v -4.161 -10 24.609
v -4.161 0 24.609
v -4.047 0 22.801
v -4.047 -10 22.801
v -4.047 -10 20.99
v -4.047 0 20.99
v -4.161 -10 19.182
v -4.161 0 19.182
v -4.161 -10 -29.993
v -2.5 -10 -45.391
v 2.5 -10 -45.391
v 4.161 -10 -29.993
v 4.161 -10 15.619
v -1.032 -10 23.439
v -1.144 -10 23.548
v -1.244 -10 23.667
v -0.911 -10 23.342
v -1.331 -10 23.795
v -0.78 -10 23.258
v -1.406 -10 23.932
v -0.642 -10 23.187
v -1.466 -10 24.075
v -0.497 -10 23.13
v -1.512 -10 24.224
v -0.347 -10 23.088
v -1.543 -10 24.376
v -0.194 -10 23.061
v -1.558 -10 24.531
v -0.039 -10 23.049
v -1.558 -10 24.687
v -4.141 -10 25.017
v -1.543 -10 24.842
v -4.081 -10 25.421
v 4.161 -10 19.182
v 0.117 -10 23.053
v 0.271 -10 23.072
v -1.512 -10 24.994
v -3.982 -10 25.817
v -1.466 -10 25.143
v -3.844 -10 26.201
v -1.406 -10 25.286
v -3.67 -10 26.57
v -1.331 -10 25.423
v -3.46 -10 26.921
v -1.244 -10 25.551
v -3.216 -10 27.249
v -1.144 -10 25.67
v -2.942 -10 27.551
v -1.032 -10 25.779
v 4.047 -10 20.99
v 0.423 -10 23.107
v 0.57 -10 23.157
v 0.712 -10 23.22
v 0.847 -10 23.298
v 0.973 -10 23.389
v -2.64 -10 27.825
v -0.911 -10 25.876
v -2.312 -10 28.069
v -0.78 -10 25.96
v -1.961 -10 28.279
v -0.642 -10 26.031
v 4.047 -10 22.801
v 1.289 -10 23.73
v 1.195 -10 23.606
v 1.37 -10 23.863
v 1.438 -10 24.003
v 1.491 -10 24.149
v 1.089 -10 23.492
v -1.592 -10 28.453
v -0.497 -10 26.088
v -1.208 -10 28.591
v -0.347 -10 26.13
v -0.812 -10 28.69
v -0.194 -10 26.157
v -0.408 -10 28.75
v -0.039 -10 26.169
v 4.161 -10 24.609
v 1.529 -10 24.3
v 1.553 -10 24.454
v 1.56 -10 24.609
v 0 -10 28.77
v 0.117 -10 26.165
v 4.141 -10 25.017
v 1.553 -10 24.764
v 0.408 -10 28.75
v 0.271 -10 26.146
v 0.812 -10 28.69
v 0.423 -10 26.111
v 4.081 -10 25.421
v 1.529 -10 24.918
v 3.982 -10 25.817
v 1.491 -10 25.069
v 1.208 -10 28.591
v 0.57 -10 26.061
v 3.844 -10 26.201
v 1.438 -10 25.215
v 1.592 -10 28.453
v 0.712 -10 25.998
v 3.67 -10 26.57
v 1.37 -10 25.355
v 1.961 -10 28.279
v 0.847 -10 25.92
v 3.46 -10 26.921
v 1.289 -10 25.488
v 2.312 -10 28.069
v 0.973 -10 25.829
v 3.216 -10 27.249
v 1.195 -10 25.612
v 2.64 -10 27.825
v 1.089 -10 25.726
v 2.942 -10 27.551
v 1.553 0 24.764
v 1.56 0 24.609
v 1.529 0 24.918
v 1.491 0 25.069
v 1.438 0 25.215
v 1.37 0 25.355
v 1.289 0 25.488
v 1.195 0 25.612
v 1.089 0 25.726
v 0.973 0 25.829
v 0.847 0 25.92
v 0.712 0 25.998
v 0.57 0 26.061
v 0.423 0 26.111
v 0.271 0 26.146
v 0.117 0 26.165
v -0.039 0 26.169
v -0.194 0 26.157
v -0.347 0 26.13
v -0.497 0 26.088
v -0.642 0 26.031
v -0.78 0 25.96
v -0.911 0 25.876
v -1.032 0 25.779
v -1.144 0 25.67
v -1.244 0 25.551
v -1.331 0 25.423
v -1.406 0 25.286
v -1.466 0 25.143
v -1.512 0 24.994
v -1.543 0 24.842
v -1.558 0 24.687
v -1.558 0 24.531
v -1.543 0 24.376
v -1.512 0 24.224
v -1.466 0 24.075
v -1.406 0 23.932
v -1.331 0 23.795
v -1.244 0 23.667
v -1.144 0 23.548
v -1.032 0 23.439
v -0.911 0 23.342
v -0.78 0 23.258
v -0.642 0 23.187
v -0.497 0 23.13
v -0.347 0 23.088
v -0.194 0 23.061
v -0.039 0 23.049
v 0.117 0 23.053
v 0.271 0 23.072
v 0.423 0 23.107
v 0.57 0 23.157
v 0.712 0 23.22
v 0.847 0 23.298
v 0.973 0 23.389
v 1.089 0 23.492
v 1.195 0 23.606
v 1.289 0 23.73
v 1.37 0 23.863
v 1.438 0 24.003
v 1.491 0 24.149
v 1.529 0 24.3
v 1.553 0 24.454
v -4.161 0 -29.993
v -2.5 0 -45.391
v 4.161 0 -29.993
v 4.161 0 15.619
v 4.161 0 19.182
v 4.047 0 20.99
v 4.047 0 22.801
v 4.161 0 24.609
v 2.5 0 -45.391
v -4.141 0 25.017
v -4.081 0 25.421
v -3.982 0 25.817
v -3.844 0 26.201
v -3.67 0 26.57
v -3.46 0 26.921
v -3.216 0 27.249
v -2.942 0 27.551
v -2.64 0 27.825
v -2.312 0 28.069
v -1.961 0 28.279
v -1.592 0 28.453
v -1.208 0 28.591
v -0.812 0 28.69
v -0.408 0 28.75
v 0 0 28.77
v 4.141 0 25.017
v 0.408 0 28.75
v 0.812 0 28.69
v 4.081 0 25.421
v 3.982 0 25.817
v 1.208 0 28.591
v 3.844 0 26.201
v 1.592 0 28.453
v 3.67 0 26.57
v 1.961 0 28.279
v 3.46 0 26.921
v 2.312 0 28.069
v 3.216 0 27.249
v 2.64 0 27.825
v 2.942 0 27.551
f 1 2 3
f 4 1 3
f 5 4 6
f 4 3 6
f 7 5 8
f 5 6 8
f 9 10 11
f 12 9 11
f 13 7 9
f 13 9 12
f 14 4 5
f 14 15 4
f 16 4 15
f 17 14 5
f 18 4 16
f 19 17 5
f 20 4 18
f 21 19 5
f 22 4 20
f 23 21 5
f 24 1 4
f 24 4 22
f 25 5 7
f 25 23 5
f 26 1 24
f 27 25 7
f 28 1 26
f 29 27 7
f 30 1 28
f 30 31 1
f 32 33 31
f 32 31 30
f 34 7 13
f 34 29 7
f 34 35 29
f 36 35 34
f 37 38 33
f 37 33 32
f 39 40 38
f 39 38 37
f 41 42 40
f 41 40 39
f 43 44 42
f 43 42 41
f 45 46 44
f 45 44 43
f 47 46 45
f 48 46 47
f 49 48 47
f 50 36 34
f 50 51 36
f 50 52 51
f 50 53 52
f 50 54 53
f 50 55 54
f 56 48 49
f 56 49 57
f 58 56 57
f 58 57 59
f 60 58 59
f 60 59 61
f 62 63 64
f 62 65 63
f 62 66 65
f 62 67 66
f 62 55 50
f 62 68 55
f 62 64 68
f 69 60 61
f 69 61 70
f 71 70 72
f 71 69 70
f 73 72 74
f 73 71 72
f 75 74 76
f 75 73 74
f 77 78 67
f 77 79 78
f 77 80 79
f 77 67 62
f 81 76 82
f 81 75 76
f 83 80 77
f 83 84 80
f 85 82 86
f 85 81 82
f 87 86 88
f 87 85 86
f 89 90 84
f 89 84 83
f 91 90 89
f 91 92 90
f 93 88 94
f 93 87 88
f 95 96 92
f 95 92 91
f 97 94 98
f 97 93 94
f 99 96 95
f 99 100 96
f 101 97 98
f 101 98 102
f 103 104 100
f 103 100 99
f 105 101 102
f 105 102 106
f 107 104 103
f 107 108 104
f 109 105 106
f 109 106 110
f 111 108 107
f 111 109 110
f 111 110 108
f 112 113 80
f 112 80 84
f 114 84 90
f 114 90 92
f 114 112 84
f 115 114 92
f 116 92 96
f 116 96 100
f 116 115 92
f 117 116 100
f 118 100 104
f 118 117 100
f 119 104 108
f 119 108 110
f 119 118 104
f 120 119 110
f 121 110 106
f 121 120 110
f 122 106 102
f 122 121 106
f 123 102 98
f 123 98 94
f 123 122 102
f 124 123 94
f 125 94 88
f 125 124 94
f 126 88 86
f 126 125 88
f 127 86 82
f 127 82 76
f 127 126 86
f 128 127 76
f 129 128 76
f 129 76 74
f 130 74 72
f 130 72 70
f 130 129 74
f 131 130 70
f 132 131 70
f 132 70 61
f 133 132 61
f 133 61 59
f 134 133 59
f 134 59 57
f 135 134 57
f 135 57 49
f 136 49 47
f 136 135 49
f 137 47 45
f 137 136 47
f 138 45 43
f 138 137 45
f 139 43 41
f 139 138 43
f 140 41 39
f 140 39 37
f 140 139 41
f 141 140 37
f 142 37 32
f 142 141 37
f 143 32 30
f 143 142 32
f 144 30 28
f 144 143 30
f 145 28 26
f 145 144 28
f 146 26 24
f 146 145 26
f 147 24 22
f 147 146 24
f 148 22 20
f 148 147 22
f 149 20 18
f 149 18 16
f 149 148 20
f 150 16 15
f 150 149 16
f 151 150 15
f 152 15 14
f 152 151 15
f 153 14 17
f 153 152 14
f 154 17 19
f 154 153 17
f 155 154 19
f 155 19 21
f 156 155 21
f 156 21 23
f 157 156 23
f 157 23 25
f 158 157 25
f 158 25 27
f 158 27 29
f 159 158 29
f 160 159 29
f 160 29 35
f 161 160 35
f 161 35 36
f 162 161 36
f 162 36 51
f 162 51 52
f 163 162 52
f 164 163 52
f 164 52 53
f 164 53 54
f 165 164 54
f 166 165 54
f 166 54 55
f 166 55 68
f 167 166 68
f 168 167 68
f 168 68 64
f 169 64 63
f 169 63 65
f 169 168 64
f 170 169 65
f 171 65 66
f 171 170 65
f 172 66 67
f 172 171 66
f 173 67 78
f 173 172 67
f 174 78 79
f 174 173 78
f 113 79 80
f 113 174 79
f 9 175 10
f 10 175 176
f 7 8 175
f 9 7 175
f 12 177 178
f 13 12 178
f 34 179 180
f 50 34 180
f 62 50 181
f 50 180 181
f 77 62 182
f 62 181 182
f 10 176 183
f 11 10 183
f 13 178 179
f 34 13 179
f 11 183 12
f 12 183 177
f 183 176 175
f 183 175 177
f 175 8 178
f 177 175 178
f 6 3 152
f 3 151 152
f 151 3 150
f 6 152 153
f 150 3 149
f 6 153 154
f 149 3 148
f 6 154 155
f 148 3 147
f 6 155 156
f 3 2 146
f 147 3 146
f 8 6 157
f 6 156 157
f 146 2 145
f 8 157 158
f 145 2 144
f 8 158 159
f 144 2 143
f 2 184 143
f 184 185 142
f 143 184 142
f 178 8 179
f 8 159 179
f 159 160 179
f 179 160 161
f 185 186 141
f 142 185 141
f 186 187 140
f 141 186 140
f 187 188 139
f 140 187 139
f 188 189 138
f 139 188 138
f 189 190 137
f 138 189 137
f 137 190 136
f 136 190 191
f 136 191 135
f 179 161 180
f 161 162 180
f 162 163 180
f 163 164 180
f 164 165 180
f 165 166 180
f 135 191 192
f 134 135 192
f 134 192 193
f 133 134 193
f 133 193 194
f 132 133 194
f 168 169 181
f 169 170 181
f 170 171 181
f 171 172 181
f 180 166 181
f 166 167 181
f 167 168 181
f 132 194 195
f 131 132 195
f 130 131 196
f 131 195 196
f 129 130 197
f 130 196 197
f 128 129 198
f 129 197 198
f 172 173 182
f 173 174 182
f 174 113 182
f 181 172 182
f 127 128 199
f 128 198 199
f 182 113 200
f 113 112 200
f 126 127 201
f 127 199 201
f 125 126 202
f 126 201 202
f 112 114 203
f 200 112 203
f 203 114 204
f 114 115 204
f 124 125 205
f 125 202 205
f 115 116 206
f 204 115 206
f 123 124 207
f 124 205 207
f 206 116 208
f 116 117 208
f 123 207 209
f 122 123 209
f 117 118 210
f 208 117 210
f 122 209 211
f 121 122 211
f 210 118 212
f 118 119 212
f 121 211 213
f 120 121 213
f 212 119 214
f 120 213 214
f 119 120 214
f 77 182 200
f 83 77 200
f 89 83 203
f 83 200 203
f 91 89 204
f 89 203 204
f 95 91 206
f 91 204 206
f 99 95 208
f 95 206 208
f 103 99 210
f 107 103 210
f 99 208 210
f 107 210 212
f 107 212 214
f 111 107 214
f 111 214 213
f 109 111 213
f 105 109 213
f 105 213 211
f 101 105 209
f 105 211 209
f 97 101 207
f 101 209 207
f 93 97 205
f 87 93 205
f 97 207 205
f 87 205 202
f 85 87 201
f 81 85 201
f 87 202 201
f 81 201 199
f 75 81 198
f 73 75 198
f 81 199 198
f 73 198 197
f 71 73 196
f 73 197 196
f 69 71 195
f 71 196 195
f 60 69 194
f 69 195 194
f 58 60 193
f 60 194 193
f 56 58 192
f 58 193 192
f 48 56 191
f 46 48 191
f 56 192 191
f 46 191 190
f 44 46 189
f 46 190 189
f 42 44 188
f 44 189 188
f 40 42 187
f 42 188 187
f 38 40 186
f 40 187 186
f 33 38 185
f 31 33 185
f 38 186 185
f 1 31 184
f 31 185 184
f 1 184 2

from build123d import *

# Parameters (mm, degrees)
F0_R     = 1.560353
F1_DEPTH = 10


with BuildPart() as f1:
    # F0 (on Front) → F1 (new body)
    with BuildSketch(Plane.XZ):
        with BuildLine():
            ThreePointArc((-4.160941, 24.608993), (-4.032911, 21.89542), (-4.160941, 19.181847))
            Line((-4.160941, 19.181847), (-4.160941, -29.993249))
            Line((-4.160941, -29.993249), (-2.5, -45.391009))
            Line((-2.5, -45.391009), (2.5, -45.391009))
            Line((2.5, -45.391009), (4.161059, -29.993249))
            Line((4.161059, -29.993249), (4.161059, 15.619488))
            Line((4.161059, 15.619488), (4.160941, 19.181847))
            ThreePointArc((4.160941, 19.181847), (4.032911, 21.89542), (4.160941, 24.608993))
            ThreePointArc((4.160941, 24.608993), (0, 28.769934), (-4.160941, 24.608993))
        make_face()
        with Locations((0, 24.608993)):
            Circle(F0_R, mode=Mode.SUBTRACT)
    extrude(amount=F1_DEPTH)


solid = f1.part
